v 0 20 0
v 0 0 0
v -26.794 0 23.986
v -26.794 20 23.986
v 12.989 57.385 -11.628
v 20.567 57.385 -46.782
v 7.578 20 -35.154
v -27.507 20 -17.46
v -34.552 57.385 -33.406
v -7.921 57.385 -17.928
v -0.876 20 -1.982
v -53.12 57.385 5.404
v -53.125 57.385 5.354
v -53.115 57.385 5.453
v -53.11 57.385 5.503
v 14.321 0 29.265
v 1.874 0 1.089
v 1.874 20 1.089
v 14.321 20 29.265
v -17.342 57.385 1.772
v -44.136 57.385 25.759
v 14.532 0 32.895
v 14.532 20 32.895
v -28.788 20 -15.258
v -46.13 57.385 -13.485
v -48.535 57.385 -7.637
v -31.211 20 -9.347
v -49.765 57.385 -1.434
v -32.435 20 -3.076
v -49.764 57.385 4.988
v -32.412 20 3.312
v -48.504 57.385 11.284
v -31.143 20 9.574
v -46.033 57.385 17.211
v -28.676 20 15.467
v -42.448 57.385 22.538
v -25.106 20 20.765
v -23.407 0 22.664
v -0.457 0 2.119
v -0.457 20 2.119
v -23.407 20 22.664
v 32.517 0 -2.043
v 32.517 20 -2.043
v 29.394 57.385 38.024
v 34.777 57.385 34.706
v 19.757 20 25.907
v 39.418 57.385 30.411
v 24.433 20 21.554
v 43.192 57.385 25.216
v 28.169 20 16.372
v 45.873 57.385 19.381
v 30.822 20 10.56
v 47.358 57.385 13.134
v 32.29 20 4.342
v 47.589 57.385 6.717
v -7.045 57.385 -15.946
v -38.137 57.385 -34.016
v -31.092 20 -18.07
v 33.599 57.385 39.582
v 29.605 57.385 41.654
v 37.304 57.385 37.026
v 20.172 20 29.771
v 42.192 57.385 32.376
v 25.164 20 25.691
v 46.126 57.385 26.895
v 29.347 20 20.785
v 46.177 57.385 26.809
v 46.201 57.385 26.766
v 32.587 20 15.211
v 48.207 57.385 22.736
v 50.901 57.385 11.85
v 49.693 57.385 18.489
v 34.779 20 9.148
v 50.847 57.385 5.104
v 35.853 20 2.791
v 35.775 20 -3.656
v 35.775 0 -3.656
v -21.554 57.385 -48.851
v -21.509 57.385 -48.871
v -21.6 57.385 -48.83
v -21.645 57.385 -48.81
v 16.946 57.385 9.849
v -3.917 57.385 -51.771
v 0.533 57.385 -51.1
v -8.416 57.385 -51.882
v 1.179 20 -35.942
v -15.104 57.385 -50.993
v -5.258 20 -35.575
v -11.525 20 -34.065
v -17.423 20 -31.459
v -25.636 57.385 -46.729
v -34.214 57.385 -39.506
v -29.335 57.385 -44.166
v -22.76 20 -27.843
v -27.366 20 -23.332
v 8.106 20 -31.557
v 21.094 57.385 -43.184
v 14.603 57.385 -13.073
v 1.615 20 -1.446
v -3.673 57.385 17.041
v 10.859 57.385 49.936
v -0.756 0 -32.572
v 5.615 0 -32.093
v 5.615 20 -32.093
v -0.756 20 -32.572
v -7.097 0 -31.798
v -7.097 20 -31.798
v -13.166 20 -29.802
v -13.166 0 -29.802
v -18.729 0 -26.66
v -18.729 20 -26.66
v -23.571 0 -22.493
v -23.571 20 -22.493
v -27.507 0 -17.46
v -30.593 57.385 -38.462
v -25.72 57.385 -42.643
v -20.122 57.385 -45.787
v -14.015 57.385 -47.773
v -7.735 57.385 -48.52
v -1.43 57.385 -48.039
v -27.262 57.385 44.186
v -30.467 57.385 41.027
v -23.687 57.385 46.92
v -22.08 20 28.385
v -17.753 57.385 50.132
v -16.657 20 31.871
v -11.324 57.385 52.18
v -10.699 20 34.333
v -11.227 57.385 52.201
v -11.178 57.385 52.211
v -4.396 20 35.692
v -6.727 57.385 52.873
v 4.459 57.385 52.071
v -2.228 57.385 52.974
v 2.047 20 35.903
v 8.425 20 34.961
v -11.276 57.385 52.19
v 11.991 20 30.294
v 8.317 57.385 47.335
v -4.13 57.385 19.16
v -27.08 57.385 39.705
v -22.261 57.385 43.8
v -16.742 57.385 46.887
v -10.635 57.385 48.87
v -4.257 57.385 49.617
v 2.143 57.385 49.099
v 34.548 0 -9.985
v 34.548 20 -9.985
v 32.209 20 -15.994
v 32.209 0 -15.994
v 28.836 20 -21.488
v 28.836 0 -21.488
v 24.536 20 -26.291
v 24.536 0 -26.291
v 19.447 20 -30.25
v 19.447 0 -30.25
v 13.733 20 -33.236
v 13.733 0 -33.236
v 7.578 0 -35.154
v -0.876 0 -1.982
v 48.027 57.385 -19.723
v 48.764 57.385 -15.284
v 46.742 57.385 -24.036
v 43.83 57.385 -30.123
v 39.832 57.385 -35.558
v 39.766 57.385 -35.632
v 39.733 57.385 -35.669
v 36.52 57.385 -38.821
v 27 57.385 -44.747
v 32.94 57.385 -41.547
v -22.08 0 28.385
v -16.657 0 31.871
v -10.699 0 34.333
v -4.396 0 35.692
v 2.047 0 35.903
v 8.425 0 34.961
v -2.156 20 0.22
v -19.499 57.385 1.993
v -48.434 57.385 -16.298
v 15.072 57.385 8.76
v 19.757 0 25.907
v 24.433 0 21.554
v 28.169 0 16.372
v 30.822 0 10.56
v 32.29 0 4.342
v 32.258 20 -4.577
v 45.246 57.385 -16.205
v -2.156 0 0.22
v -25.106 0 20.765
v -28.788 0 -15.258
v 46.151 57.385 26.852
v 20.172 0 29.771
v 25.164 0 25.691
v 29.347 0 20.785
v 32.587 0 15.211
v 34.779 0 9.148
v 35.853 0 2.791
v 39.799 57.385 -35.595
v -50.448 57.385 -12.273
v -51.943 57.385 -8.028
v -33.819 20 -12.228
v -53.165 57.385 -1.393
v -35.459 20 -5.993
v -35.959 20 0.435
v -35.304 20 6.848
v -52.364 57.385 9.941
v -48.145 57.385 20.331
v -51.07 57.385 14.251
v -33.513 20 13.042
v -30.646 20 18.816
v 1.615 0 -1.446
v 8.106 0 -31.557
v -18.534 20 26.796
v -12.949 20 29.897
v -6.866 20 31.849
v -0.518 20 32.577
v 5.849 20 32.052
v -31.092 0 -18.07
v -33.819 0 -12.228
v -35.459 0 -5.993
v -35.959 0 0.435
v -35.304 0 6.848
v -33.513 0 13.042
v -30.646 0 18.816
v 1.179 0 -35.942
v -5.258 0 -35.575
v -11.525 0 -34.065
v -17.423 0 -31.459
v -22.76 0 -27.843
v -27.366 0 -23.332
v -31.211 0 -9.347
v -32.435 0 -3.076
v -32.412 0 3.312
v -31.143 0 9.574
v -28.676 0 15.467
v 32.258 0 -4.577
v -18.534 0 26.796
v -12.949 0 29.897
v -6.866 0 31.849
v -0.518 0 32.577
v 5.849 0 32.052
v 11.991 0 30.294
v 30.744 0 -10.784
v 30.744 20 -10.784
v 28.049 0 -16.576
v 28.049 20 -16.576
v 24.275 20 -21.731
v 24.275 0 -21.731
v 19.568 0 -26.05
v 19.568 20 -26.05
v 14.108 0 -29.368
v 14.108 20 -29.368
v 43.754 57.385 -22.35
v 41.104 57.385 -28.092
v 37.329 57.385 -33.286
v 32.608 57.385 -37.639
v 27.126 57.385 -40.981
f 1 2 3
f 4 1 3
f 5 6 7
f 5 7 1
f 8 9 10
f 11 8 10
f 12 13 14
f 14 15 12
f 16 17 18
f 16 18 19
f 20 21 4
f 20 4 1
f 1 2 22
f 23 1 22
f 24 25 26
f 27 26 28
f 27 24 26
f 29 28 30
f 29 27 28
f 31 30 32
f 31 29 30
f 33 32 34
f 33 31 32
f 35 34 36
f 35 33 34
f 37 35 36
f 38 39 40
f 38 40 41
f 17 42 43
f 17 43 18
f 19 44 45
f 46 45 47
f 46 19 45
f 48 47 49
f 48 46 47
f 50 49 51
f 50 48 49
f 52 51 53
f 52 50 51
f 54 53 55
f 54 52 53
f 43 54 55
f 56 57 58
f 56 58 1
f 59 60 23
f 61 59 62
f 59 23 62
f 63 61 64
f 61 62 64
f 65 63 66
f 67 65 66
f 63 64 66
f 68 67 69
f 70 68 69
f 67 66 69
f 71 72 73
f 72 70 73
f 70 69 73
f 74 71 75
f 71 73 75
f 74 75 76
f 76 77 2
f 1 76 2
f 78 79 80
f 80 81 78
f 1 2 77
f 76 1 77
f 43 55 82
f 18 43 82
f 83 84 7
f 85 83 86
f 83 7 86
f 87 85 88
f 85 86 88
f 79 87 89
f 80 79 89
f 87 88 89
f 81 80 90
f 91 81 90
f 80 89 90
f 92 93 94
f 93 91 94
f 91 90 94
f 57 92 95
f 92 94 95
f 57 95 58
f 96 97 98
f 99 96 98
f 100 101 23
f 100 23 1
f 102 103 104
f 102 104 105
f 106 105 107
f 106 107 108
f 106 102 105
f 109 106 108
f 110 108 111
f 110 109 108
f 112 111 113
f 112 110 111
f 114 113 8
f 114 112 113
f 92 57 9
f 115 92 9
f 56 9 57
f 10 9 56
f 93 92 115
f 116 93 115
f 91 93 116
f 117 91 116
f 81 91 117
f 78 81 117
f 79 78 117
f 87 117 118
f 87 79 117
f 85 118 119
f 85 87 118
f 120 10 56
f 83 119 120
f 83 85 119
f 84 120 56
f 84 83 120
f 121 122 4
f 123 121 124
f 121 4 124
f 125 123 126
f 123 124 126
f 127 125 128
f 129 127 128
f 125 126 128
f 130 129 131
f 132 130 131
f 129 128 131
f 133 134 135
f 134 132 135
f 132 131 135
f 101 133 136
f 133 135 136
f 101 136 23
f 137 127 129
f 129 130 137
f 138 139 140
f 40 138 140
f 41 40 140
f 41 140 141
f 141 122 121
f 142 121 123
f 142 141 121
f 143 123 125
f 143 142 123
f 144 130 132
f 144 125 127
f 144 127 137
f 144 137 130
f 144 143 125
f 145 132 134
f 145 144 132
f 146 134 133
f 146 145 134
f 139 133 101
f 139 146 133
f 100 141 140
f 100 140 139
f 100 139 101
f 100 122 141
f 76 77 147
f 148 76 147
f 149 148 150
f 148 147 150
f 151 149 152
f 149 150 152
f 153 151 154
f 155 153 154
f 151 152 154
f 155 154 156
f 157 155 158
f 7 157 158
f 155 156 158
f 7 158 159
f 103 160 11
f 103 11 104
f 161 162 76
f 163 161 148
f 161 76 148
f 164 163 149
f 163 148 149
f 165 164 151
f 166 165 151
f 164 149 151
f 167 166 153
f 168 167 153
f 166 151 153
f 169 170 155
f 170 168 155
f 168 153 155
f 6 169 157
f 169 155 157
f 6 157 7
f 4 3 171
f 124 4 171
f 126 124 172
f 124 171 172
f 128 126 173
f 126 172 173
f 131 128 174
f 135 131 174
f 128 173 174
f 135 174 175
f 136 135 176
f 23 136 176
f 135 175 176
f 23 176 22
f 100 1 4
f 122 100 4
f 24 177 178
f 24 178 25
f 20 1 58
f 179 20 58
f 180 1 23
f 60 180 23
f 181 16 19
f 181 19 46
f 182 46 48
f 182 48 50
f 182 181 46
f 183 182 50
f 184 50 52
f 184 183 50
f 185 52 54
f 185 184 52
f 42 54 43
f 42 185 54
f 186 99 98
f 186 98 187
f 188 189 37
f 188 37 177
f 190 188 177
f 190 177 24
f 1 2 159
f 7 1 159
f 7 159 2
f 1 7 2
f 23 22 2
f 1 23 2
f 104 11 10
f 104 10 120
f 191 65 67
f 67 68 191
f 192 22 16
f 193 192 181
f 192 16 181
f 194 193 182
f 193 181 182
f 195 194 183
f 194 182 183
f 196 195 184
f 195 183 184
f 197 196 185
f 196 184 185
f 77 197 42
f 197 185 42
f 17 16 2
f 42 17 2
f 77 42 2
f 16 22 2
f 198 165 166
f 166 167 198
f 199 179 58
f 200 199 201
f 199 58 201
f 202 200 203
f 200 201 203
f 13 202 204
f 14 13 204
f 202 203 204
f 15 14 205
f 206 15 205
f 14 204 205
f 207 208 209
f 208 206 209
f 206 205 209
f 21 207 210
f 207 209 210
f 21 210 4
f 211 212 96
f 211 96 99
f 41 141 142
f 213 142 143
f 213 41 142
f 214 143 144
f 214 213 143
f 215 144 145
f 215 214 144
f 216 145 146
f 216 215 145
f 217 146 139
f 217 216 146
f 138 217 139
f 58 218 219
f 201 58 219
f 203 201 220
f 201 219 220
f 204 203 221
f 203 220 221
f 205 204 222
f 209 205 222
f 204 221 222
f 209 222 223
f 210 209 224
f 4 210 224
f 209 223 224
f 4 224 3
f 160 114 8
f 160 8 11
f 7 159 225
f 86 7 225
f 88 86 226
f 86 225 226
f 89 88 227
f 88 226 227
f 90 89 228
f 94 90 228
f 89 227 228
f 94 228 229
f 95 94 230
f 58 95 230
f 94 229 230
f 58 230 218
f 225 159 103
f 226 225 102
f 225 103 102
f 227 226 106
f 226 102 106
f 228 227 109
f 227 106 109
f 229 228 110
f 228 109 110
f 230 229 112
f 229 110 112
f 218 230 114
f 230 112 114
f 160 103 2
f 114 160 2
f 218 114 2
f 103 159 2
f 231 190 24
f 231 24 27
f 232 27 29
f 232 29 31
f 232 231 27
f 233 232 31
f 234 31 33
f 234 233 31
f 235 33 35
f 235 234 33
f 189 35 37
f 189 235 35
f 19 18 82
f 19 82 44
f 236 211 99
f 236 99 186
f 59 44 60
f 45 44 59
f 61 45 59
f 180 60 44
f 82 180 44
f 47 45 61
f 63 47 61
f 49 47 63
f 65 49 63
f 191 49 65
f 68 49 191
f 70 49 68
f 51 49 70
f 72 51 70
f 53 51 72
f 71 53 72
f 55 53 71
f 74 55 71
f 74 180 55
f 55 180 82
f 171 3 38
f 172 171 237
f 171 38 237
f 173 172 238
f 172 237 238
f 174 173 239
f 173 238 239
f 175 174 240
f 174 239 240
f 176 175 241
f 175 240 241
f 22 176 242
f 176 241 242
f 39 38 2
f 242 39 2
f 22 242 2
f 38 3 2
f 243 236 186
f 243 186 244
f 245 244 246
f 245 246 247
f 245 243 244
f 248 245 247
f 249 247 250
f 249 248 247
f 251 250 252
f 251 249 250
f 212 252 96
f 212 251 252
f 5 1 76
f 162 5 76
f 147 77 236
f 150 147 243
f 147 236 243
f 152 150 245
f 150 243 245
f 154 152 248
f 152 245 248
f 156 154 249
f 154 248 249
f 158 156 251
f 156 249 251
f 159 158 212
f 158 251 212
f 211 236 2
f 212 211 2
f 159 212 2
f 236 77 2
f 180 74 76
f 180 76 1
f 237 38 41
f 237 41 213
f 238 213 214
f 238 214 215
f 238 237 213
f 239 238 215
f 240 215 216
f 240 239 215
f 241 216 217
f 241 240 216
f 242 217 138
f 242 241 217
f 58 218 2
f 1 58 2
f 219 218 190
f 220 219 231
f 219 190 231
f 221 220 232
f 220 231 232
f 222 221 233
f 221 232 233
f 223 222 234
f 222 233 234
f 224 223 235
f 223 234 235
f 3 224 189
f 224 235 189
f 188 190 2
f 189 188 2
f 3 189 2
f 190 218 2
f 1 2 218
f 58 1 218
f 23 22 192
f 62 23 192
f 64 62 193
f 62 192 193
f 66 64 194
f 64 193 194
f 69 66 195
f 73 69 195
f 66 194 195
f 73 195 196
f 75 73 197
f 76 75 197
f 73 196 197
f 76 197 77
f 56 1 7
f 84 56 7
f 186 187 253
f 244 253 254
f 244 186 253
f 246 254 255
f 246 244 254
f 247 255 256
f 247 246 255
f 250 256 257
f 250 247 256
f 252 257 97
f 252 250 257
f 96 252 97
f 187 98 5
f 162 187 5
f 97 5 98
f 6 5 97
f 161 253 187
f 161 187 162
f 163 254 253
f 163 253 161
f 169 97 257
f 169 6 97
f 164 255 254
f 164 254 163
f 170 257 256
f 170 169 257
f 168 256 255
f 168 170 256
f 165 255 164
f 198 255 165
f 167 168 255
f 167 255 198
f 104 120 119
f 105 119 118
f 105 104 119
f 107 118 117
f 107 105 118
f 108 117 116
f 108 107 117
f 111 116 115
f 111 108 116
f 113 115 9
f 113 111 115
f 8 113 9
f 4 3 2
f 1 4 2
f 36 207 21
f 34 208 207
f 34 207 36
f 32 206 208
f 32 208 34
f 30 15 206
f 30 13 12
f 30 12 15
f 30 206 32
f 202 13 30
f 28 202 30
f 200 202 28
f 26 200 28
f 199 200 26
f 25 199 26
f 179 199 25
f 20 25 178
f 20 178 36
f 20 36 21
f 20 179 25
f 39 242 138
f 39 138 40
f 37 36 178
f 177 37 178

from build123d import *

# Parameters (mm, degrees)
BOSS_EXTRUDE1_DEPTH = 20
BOSS_EXTRUDE2_REACH = 128.869
CIRPATTERN1_COUNT   = 5
SKETCH5_W           = 180.779020629
SKETCH5_H           = 221.21381005
CUT_EXTRUDE1_DEPTH  = 95.689142857


with BuildPart() as part:
    # Sketch1 → Boss-Extrude1 (new body)
    with BuildSketch(Plane(origin=(0, 0, 0), x_dir=(1, 0, 0), z_dir=(0, 1, 0))):
        with BuildLine():
            Line((0, 0), (-26.793822286, -23.986144202))
            ThreePointArc((-26.793822286, -23.986144202), (-7.577955752, -35.154211881), (14.532432314, -32.894565469))
            Line((14.532432314, -32.894565469), (0, 0))
        make_face()
        with BuildLine():
            Line((-0.456697225, -2.118622956), (-23.40666458, -22.663703107))
            ThreePointArc((-23.40666458, -22.663703107), (-6.865544258, -31.849327894), (11.990905198, -30.294117875))
            Line((11.990905198, -30.294117875), (-0.456697225, -2.118622956))
        make_face(mode=Mode.SUBTRACT)
    extrude(amount=BOSS_EXTRUDE1_DEPTH)

    # Boss-Extrude2: up to this plane
    boss_extrude2_end = Plane(origin=(-6.641185463, 67.586699078, 30.80852522), z_dir=(0.08905536417875298, -0.906307787036651, -0.4131287175538856))
    # Sketch4 → Boss-Extrude2 (add, up to the surface)
    with BuildSketch(Plane(origin=(0, 20, 0), x_dir=(1, 0, 0), z_dir=(0, 1, 0)), mode=Mode.PRIVATE) as boss_extrude2_sk1:
        with BuildLine():
            Line((14.532432314, -32.894565469), (0, 0))
            Line((0, 0), (-26.793822286, -23.986144202))
            ThreePointArc((-26.793822286, -23.986144202), (-7.577955752, -35.154211881), (14.532432314, -32.894565469))
        make_face()
        with BuildLine():
            Line((-0.456697225, -2.118622956), (-23.40666458, -22.663703107))
            ThreePointArc((-23.40666458, -22.663703107), (-6.865544258, -31.849327894), (11.990905198, -30.294117875))
            Line((11.990905198, -30.294117875), (-0.456697225, -2.118622956))
        make_face(mode=Mode.SUBTRACT)
    boss_extrude2_tool1 = split(extrude(boss_extrude2_sk1.sketch, amount=BOSS_EXTRUDE2_REACH, dir=(-0.089055364179, 0.906307787037, 0.413128717554), mode=Mode.PRIVATE), bisect_by=boss_extrude2_end, keep=Keep.BOTH, mode=Mode.PRIVATE)
    add(boss_extrude2_tool1.solids().sort_by_distance((6.765116, 20, 16.668663))[0])


with BuildPart() as cirpattern1_1:
    # CirPattern1: pattern copy
    add(part.part.rotate(Axis((0, 20, 0), (0, -1, 0)), 1 * 360 / CIRPATTERN1_COUNT))


with BuildPart() as cirpattern1_2:
    # CirPattern1: pattern copy
    add(part.part.rotate(Axis((0, 20, 0), (0, -1, 0)), 2 * 360 / CIRPATTERN1_COUNT))


with BuildPart() as cirpattern1_3:
    # CirPattern1: pattern copy
    add(part.part.rotate(Axis((0, 20, 0), (0, -1, 0)), 3 * 360 / CIRPATTERN1_COUNT))


with BuildPart() as cirpattern1_4:
    # CirPattern1: pattern copy
    add(part.part.rotate(Axis((0, 20, 0), (0, -1, 0)), 4 * 360 / CIRPATTERN1_COUNT))


with BuildPart() as cut_extrude1_tool:
    # Sketch5 → Cut-Extrude1 (new, through all)
    with BuildSketch(Plane(origin=(0, 57.384721563, 0), x_dir=(1, 0, 0), z_dir=(0, 1, 0))):
        with Locations((-14.750659077, -8.714038408)):
            Rectangle(SKETCH5_W, SKETCH5_H)
    extrude(amount=CUT_EXTRUDE1_DEPTH)


with BuildPart() as part_1:
    add(part.part)

    # Cut-Extrude1: cut by cut_extrude1_tool
    add(cut_extrude1_tool.part, mode=Mode.SUBTRACT)


with BuildPart() as cirpattern1_1_1:
    add(cirpattern1_1.part)

    # Cut-Extrude1: cut by cut_extrude1_tool
    add(cut_extrude1_tool.part, mode=Mode.SUBTRACT)


with BuildPart() as cirpattern1_2_1:
    add(cirpattern1_2.part)

    # Cut-Extrude1: cut by cut_extrude1_tool
    add(cut_extrude1_tool.part, mode=Mode.SUBTRACT)


with BuildPart() as cirpattern1_3_1:
    add(cirpattern1_3.part)

    # Cut-Extrude1: cut by cut_extrude1_tool
    add(cut_extrude1_tool.part, mode=Mode.SUBTRACT)


with BuildPart() as cirpattern1_4_1:
    add(cirpattern1_4.part)

    # Cut-Extrude1: cut by cut_extrude1_tool
    add(cut_extrude1_tool.part, mode=Mode.SUBTRACT)


solid = Compound([part_1.part, cirpattern1_1_1.part, cirpattern1_2_1.part, cirpattern1_3_1.part, cirpattern1_4_1.part])
